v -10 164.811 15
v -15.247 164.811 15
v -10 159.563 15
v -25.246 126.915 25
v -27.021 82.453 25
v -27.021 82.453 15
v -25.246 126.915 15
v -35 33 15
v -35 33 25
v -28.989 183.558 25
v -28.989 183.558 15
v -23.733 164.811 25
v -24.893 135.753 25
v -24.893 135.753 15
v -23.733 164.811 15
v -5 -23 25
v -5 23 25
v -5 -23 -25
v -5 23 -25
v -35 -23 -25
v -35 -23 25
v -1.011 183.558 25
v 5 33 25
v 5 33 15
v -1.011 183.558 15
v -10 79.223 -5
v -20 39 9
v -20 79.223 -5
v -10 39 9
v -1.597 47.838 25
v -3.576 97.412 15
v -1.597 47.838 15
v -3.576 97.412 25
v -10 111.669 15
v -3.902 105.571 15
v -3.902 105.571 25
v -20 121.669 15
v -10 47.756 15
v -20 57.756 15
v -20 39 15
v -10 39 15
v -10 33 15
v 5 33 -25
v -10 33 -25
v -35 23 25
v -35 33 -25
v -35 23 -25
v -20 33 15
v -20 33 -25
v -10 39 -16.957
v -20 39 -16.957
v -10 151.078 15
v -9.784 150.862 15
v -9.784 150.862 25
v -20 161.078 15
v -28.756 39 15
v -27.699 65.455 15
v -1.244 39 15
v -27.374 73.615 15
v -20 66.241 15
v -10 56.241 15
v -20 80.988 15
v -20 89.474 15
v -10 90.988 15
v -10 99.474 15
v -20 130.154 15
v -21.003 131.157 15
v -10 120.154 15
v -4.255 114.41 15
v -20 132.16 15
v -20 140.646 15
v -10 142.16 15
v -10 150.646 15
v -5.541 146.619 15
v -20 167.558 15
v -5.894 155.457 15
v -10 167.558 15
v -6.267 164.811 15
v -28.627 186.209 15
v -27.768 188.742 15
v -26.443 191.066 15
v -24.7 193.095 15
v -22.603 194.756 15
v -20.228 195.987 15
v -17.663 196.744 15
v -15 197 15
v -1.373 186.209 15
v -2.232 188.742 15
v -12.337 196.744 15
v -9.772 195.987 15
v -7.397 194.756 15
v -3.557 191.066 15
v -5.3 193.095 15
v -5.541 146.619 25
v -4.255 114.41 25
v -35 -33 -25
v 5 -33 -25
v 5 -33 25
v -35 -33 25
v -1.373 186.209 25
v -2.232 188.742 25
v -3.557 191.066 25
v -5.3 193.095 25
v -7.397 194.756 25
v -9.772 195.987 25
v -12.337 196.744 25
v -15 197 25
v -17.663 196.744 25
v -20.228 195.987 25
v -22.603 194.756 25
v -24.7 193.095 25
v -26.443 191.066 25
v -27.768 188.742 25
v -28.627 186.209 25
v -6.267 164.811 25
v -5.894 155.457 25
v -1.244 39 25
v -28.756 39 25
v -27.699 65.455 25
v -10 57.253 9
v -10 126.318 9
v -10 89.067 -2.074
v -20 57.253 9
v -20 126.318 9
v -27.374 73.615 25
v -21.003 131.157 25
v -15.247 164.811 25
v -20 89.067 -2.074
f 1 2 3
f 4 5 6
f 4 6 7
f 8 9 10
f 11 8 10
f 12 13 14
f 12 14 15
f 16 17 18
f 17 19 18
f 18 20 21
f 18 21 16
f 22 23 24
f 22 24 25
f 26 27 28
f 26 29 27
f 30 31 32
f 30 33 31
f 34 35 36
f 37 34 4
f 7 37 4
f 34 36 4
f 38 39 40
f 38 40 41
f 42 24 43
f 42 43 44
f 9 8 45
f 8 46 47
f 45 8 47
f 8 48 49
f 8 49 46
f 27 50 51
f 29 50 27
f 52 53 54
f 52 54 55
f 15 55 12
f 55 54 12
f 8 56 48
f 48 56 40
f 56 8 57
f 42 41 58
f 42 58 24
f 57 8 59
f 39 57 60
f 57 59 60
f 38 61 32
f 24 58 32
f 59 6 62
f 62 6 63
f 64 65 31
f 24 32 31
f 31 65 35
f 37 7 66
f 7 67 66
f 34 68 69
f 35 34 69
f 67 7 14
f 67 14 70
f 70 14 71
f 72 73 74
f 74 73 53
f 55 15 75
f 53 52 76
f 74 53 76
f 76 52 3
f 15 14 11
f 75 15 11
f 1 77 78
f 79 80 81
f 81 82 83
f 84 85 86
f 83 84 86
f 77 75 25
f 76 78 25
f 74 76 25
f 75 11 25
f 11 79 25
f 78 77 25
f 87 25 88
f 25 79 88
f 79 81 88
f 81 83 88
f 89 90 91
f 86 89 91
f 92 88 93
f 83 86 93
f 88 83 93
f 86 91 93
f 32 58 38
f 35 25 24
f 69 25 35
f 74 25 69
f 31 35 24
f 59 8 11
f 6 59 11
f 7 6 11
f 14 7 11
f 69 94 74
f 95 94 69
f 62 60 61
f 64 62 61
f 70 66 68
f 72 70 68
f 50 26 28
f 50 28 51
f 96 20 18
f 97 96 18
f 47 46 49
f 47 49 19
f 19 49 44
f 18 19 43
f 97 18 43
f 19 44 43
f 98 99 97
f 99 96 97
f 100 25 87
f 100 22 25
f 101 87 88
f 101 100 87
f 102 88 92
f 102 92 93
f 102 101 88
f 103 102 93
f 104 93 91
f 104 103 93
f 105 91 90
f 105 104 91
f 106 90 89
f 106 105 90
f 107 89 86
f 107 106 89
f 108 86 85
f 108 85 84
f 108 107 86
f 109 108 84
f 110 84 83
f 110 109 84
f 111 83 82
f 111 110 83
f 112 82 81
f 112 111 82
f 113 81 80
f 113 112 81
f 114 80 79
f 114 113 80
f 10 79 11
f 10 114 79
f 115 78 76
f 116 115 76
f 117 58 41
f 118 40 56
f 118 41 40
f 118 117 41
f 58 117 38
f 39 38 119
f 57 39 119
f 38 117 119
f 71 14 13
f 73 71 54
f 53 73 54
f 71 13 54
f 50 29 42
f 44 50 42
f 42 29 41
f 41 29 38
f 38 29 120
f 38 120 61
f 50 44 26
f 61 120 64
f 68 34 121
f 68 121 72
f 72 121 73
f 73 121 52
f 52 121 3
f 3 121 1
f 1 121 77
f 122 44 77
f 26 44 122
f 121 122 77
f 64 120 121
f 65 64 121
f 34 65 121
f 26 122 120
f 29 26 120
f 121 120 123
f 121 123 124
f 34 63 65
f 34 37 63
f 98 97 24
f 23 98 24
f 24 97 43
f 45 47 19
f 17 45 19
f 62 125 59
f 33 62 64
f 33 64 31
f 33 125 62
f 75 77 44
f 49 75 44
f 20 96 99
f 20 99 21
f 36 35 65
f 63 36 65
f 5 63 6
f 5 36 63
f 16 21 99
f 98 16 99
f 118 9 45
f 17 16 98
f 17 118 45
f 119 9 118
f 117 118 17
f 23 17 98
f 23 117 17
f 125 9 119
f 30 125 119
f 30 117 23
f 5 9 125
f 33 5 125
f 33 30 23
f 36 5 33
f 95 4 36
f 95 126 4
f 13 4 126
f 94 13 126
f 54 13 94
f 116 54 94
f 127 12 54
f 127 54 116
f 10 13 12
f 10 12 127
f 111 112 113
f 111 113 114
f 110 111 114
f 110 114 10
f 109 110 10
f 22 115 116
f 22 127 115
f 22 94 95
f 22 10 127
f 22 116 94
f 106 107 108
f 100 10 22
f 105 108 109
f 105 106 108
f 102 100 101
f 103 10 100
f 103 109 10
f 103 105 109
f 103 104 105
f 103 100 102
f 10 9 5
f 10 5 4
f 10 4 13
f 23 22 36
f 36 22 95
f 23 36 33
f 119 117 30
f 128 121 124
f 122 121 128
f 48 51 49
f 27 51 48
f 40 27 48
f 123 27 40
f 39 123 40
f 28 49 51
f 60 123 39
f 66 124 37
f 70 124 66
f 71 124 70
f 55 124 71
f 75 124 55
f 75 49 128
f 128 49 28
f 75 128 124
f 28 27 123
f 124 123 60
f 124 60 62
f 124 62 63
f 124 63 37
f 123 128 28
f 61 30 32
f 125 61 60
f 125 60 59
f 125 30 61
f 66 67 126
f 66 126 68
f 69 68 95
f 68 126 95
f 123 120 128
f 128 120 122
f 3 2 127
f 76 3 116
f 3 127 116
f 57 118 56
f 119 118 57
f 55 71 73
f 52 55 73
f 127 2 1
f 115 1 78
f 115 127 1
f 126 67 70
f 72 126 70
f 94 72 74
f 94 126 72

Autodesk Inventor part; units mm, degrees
ref_plane "YZ Plane" through (0, 0, 0) normal (1, 0, 0) x (0, 1, 0)
ref_plane "XZ Plane" through (0, 0, 0) normal (0, 1, 0) x (-1, 0, 0)
sketch "스케치1" plane through (0, 0, 0) normal (0, 0, 1) x (1, 0, 0)
  line L0 (-5, -33) -> (5, -33)
  line L1 (5, -33) -> (5, 33)
  line L2 (5, 33) -> (-5, 33)
  line L3 (-5, 33) -> (-5, -33)
  line L4 (-5, -33) -> (5, 33) construction
  line L5 (5, -33) -> (-5, 33) construction
  line L6 (-5, 33) -> (-35, 33)
  line L7 (-35, 33) -> (-35, 23)
  line L8 (-35, 23) -> (-5, 23)
  line L9 (-5, 23) -> (-5, 33)
  line L10 (0, 0) -> (-11.0402, 0)
  line L11 (-5, -33) -> (-35, -33)
  line L12 (-35, -33) -> (-35, -23)
  line L13 (-35, -23) -> (-5, -23)
  point P0 (-5, 23)
  point P1 (-5, -23)
  dimension "d0" = 66
  dimension "d1" = 10
  dimension "d2" = 10
  dimension "d3" = 30
extrude "돌출1" add sketch "스케치1" along normal mid plane 50
sketch "스케치2" plane through (0, 0, 25) normal (0, 0, 1) x (1, 0, 0)
  circle A0 centre (-15, 183) radius 14
  line L0 (-35, 33) -> (-35, 23) projected
  line L1 (-35, 33) -> (-28.9889, 183.5585)
  line L2 (5, 33) -> (-35, 33) projected
  line L3 (-15, 33) -> (-15, 183) construction
  line L4 (5, 33) -> (-1.0111, 183.5585)
  point P0 (0, 0)
  dimension "d6" = 28
  dimension "d17" = 6
  dimension "d7" = 150
extrude "돌출2" add sketch "스케치2" against normal blind 10
ref_plane "작업 평면1" through (-15, 23, -25) normal (-1, 0, 0) x (0, 0, 1)
sketch "스케치3" plane through (-15, 23, -25) normal (-1, 0, 0) x (0, 0, 1)
  line L0 (40, 160.5585) -> (40, 10) projected
  line L1 (0, 10) -> (40, 10) projected
  line L2 (40, 144.5585) -> (0, 10)
  line L3 (45.7513, 142.8488) -> (8.0431, 16)
  line L4 (8.0431, 16) -> (34, 16)
  line L5 (34, 16) -> (34, 160.5585)
  line L6 (34, 16) -> (20, 56.2226)
  line L7 (34, 34.2526) -> (22.9265, 66.0672)
  point P0 (25, -23)
  point P1 (34, 103.318)
  point P2 (34, 124.3747)
  point P3 (40, 123.5018)
  dimension "d10" = 16
  dimension "d11" = 6
  dimension "d12" = 6
extrude "돌출3" add sketch "스케치3" along normal mid plane 10 contours L0 L3 L5 L2 | L0 L1 L2 L5 L3 | L7 L5 L6 L3
sketch "스케치4" plane through (0, 0, 25) normal (0, 0, 1) x (1, 0, 0)
  line L0 (-35, 33) -> (-28.9889, 183.5585) projected
  line L1 (5, 33) -> (-1.0111, 183.5585) projected
  line L2 (-35, 33) -> (5, 33)
  arc A0 (-1.0111, 183.5585) -> (-28.9889, 183.5585) centre (-15, 183) ccw projected
  line L3 (-7.0064, 183.3192) -> (-1.2443, 39)
  line L4 (-1.2443, 39) -> (-28.7557, 39)
  line L5 (-28.7557, 39) -> (-22.9936, 183.3192)
  arc A1 (-7.0064, 183.3192) -> (-22.9936, 183.3192) centre (-15, 183) ccw
  line L6 (-1.2443, 39) -> (-27.6994, 65.4551)
  line L7 (-1.5972, 47.8382) -> (-27.3737, 73.6146)
  line L8 (-27.3737, 73.6146) -> (-3.5765, 97.4118)
  line L9 (-3.9022, 105.5713) -> (-27.0208, 82.4528)
  line L10 (-3.9022, 105.5713) -> (-25.2456, 126.9147)
  line L11 (-25.2456, 126.9147) -> (-5.5411, 146.6192)
  line L12 (-5.5411, 146.6192) -> (-23.7326, 164.8107)
  line L13 (-23.7326, 164.8107) -> (-6.2674, 164.8107)
  line L14 (-21.003, 131.1573) -> (-4.2551, 114.4095)
  line L15 (-15.2473, 164.8107) -> (-5.894, 155.4574)
  line L16 (-24.8927, 135.7528) -> (-9.7837, 150.8618)
  point P0 (0, 0)
  point P1 (-5.2153, 138.4597)
  dimension "d15" = 6
  dimension "d16" = 45
  dimension "d17" = 6
  dimension "d18" = 90
  dimension "d19" = 6
  dimension "d23" = 6
extrude "돌출4" cut sketch "스케치4" against normal blind 10 contours L3 L15 L13 | L12 L16 L5 | L3 L14 L11 | L10 L9 L5 | L3 L7 L8 | L6 L4 L5
properties part number "전체 형상"
